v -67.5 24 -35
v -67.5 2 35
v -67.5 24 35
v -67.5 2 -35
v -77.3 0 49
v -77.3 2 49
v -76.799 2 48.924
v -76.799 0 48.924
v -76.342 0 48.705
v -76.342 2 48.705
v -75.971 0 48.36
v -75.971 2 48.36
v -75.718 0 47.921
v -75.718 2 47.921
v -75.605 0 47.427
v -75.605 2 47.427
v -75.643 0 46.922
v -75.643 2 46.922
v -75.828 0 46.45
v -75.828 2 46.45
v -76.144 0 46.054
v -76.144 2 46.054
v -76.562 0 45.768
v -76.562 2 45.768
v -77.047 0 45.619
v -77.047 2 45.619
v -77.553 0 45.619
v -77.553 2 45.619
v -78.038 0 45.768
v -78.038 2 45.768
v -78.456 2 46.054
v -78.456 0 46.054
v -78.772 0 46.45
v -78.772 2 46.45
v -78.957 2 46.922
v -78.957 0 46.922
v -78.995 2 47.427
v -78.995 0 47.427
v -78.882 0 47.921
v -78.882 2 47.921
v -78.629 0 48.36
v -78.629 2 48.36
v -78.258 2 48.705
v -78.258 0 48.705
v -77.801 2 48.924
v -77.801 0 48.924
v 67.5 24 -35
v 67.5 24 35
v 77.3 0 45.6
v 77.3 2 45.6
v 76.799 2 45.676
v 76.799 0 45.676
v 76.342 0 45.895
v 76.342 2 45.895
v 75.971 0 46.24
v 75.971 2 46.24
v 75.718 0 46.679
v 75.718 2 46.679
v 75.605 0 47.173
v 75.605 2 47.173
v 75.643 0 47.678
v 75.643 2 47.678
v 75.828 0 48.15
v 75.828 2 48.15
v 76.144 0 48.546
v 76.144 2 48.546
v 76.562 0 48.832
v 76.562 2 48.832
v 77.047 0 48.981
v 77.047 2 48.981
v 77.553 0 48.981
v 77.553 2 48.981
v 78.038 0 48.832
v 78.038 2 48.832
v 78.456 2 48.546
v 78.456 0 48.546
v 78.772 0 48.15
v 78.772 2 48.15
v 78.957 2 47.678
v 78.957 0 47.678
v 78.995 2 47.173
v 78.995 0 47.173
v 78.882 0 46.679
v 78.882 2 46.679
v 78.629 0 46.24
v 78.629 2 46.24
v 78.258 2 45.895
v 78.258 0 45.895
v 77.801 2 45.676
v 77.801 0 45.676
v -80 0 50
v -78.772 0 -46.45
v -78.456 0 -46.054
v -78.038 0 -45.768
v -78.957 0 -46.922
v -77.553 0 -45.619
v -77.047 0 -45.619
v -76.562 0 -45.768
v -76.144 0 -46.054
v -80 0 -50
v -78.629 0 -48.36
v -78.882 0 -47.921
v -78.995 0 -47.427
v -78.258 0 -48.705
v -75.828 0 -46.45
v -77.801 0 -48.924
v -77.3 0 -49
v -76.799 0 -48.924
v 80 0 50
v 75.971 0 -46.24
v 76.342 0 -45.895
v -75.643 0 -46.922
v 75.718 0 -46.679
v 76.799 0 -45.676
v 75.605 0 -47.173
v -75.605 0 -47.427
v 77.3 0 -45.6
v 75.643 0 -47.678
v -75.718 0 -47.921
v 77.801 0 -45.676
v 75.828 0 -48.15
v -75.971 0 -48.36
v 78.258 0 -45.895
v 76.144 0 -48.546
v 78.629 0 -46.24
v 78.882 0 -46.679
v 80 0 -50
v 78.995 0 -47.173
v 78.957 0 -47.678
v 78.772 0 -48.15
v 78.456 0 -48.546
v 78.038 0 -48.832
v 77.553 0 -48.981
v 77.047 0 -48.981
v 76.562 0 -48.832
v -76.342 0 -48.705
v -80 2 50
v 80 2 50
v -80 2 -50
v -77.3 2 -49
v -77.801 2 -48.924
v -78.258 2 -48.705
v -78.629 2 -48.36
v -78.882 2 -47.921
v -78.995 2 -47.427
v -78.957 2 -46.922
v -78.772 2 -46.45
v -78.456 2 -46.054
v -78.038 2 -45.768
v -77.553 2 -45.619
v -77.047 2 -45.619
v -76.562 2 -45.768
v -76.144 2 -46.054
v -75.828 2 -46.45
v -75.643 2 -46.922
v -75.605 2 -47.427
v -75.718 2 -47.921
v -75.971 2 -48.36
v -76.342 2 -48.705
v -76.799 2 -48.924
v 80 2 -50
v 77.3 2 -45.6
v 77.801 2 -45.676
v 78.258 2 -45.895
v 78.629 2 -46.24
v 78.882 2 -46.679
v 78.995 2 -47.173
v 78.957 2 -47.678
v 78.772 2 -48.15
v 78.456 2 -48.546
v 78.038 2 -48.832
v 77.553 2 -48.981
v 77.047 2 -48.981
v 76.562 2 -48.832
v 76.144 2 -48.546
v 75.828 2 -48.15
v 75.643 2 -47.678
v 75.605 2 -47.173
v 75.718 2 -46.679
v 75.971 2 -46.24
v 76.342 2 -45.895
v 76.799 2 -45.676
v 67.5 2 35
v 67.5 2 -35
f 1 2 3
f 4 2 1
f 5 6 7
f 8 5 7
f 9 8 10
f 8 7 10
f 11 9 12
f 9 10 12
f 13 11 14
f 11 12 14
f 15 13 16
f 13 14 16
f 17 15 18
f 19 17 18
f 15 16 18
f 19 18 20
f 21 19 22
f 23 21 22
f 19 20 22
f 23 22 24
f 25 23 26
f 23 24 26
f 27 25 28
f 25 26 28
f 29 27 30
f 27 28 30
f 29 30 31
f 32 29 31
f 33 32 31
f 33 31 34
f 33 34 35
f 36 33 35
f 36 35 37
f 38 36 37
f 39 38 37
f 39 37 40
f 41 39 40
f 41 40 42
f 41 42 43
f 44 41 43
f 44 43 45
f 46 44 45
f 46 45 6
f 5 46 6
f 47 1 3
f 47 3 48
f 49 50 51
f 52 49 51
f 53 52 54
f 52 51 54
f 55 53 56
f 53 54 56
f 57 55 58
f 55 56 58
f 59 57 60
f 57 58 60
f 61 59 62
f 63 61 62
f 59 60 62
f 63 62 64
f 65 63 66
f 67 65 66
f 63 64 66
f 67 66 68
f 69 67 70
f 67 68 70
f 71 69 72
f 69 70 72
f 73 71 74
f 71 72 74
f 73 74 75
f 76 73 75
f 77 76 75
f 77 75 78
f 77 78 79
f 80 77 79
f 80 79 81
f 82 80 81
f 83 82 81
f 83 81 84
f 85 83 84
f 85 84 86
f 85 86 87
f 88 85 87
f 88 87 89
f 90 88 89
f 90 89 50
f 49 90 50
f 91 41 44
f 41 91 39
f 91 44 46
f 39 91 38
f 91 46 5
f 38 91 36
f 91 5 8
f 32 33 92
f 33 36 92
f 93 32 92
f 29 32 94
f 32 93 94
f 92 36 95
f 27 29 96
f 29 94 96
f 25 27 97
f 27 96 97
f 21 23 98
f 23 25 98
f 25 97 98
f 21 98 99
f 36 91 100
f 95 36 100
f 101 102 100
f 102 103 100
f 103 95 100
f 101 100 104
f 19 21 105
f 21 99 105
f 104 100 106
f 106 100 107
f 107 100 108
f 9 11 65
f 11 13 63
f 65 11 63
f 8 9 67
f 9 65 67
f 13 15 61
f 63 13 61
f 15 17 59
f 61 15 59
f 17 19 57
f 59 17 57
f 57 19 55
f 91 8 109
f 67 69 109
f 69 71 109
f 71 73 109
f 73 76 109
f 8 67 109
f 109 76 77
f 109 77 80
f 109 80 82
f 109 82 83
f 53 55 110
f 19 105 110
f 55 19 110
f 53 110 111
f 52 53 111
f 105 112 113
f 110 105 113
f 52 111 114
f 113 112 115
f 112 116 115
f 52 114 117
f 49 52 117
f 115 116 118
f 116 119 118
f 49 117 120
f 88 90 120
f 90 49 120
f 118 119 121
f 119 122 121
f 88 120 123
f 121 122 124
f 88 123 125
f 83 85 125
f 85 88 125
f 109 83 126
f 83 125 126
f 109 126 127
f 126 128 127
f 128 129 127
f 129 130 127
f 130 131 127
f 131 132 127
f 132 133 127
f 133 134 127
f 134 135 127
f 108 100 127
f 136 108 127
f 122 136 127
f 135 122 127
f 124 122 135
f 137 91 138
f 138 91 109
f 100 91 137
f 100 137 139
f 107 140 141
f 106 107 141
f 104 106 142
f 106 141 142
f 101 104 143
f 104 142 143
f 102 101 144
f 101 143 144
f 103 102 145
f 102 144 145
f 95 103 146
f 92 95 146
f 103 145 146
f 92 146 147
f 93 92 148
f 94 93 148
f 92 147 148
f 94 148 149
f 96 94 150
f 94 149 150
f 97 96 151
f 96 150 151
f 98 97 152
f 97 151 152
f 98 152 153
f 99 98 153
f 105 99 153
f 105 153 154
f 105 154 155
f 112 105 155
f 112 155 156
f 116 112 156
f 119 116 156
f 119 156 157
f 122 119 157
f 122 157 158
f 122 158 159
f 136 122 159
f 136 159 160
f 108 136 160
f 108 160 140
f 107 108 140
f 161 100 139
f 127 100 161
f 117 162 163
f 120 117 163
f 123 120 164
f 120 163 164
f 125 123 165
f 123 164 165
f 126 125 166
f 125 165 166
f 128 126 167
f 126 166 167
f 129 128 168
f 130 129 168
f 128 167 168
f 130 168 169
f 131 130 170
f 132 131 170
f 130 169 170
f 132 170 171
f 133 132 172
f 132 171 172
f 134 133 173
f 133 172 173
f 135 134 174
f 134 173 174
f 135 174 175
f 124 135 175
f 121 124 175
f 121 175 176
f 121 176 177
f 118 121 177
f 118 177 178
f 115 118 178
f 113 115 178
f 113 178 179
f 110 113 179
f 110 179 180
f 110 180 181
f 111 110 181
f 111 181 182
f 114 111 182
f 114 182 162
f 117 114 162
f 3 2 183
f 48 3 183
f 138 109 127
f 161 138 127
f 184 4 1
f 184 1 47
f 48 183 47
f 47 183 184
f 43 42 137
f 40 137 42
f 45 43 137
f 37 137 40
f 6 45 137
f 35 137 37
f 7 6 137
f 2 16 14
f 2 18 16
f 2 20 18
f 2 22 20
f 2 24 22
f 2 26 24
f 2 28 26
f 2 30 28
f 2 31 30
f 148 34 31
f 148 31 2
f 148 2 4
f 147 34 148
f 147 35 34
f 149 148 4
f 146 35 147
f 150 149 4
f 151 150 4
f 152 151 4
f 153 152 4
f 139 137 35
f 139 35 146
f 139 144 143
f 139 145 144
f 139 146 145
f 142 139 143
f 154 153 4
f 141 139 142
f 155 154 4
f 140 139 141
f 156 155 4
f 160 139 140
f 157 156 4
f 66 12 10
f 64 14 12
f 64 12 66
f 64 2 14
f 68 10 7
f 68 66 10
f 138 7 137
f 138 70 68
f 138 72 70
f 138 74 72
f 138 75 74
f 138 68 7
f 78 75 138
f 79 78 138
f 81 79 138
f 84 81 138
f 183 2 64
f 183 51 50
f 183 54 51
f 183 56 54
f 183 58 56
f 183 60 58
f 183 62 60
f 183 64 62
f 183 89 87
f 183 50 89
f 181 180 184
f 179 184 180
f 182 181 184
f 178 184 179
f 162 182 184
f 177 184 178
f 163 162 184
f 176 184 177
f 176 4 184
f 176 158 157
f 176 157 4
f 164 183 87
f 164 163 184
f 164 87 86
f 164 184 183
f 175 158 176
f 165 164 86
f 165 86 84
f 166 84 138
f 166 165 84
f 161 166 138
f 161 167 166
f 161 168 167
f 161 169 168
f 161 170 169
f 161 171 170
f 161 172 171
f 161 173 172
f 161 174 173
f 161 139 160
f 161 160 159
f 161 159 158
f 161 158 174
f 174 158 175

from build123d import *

# Parameters (mm, degrees)
SKETCH_1_W          = 160
SKETCH_1_H          = 100
EXTRUDE_1_DEPTH     = 2
SKETCH_2_R          = 1.7
CUT_EXTRUDE_1_DEPTH = 95.361008897
SKETCH_3_W          = 135
SKETCH_3_H          = 70
EXTRUDE_2_DEPTH     = 22


with BuildPart() as part:
    # 스케치1 → 보스-돌출1 (new body)
    with BuildSketch(Plane(origin=(0, 0, 0), x_dir=(1, 0, 0), z_dir=(0, 1, 0))):
        Rectangle(SKETCH_1_W, SKETCH_1_H)
    extrude(amount=EXTRUDE_1_DEPTH)

    # 스케치2 → 컷-돌출1 (cut, through all)
    with BuildSketch(Plane(origin=(0, 2, 0), x_dir=(1, 0, 0), z_dir=(0, 1, 0))):
        with Locations(Location((77.3, 47.3, 0), (0, 0, 270))):
            Circle(SKETCH_2_R)
        with Locations(Location((77.3, -47.3, 0), (0, 0, 90))):
            Circle(SKETCH_2_R)
        with Locations(Location((-77.3, -47.3, 0), (0, 0, 270))):
            Circle(SKETCH_2_R)
        with Locations(Location((-77.3, 47.3, 0), (0, 0, 90))):
            Circle(SKETCH_2_R)
    extrude(amount=-CUT_EXTRUDE_1_DEPTH, mode=Mode.SUBTRACT)

    # 스케치3 → 보스-돌출2 (add)
    with BuildSketch(Plane(origin=(0, 2, 0), x_dir=(1, 0, 0), z_dir=(0, 1, 0))):
        Rectangle(SKETCH_3_W, SKETCH_3_H)
    extrude(amount=EXTRUDE_2_DEPTH)


solid = part.part
